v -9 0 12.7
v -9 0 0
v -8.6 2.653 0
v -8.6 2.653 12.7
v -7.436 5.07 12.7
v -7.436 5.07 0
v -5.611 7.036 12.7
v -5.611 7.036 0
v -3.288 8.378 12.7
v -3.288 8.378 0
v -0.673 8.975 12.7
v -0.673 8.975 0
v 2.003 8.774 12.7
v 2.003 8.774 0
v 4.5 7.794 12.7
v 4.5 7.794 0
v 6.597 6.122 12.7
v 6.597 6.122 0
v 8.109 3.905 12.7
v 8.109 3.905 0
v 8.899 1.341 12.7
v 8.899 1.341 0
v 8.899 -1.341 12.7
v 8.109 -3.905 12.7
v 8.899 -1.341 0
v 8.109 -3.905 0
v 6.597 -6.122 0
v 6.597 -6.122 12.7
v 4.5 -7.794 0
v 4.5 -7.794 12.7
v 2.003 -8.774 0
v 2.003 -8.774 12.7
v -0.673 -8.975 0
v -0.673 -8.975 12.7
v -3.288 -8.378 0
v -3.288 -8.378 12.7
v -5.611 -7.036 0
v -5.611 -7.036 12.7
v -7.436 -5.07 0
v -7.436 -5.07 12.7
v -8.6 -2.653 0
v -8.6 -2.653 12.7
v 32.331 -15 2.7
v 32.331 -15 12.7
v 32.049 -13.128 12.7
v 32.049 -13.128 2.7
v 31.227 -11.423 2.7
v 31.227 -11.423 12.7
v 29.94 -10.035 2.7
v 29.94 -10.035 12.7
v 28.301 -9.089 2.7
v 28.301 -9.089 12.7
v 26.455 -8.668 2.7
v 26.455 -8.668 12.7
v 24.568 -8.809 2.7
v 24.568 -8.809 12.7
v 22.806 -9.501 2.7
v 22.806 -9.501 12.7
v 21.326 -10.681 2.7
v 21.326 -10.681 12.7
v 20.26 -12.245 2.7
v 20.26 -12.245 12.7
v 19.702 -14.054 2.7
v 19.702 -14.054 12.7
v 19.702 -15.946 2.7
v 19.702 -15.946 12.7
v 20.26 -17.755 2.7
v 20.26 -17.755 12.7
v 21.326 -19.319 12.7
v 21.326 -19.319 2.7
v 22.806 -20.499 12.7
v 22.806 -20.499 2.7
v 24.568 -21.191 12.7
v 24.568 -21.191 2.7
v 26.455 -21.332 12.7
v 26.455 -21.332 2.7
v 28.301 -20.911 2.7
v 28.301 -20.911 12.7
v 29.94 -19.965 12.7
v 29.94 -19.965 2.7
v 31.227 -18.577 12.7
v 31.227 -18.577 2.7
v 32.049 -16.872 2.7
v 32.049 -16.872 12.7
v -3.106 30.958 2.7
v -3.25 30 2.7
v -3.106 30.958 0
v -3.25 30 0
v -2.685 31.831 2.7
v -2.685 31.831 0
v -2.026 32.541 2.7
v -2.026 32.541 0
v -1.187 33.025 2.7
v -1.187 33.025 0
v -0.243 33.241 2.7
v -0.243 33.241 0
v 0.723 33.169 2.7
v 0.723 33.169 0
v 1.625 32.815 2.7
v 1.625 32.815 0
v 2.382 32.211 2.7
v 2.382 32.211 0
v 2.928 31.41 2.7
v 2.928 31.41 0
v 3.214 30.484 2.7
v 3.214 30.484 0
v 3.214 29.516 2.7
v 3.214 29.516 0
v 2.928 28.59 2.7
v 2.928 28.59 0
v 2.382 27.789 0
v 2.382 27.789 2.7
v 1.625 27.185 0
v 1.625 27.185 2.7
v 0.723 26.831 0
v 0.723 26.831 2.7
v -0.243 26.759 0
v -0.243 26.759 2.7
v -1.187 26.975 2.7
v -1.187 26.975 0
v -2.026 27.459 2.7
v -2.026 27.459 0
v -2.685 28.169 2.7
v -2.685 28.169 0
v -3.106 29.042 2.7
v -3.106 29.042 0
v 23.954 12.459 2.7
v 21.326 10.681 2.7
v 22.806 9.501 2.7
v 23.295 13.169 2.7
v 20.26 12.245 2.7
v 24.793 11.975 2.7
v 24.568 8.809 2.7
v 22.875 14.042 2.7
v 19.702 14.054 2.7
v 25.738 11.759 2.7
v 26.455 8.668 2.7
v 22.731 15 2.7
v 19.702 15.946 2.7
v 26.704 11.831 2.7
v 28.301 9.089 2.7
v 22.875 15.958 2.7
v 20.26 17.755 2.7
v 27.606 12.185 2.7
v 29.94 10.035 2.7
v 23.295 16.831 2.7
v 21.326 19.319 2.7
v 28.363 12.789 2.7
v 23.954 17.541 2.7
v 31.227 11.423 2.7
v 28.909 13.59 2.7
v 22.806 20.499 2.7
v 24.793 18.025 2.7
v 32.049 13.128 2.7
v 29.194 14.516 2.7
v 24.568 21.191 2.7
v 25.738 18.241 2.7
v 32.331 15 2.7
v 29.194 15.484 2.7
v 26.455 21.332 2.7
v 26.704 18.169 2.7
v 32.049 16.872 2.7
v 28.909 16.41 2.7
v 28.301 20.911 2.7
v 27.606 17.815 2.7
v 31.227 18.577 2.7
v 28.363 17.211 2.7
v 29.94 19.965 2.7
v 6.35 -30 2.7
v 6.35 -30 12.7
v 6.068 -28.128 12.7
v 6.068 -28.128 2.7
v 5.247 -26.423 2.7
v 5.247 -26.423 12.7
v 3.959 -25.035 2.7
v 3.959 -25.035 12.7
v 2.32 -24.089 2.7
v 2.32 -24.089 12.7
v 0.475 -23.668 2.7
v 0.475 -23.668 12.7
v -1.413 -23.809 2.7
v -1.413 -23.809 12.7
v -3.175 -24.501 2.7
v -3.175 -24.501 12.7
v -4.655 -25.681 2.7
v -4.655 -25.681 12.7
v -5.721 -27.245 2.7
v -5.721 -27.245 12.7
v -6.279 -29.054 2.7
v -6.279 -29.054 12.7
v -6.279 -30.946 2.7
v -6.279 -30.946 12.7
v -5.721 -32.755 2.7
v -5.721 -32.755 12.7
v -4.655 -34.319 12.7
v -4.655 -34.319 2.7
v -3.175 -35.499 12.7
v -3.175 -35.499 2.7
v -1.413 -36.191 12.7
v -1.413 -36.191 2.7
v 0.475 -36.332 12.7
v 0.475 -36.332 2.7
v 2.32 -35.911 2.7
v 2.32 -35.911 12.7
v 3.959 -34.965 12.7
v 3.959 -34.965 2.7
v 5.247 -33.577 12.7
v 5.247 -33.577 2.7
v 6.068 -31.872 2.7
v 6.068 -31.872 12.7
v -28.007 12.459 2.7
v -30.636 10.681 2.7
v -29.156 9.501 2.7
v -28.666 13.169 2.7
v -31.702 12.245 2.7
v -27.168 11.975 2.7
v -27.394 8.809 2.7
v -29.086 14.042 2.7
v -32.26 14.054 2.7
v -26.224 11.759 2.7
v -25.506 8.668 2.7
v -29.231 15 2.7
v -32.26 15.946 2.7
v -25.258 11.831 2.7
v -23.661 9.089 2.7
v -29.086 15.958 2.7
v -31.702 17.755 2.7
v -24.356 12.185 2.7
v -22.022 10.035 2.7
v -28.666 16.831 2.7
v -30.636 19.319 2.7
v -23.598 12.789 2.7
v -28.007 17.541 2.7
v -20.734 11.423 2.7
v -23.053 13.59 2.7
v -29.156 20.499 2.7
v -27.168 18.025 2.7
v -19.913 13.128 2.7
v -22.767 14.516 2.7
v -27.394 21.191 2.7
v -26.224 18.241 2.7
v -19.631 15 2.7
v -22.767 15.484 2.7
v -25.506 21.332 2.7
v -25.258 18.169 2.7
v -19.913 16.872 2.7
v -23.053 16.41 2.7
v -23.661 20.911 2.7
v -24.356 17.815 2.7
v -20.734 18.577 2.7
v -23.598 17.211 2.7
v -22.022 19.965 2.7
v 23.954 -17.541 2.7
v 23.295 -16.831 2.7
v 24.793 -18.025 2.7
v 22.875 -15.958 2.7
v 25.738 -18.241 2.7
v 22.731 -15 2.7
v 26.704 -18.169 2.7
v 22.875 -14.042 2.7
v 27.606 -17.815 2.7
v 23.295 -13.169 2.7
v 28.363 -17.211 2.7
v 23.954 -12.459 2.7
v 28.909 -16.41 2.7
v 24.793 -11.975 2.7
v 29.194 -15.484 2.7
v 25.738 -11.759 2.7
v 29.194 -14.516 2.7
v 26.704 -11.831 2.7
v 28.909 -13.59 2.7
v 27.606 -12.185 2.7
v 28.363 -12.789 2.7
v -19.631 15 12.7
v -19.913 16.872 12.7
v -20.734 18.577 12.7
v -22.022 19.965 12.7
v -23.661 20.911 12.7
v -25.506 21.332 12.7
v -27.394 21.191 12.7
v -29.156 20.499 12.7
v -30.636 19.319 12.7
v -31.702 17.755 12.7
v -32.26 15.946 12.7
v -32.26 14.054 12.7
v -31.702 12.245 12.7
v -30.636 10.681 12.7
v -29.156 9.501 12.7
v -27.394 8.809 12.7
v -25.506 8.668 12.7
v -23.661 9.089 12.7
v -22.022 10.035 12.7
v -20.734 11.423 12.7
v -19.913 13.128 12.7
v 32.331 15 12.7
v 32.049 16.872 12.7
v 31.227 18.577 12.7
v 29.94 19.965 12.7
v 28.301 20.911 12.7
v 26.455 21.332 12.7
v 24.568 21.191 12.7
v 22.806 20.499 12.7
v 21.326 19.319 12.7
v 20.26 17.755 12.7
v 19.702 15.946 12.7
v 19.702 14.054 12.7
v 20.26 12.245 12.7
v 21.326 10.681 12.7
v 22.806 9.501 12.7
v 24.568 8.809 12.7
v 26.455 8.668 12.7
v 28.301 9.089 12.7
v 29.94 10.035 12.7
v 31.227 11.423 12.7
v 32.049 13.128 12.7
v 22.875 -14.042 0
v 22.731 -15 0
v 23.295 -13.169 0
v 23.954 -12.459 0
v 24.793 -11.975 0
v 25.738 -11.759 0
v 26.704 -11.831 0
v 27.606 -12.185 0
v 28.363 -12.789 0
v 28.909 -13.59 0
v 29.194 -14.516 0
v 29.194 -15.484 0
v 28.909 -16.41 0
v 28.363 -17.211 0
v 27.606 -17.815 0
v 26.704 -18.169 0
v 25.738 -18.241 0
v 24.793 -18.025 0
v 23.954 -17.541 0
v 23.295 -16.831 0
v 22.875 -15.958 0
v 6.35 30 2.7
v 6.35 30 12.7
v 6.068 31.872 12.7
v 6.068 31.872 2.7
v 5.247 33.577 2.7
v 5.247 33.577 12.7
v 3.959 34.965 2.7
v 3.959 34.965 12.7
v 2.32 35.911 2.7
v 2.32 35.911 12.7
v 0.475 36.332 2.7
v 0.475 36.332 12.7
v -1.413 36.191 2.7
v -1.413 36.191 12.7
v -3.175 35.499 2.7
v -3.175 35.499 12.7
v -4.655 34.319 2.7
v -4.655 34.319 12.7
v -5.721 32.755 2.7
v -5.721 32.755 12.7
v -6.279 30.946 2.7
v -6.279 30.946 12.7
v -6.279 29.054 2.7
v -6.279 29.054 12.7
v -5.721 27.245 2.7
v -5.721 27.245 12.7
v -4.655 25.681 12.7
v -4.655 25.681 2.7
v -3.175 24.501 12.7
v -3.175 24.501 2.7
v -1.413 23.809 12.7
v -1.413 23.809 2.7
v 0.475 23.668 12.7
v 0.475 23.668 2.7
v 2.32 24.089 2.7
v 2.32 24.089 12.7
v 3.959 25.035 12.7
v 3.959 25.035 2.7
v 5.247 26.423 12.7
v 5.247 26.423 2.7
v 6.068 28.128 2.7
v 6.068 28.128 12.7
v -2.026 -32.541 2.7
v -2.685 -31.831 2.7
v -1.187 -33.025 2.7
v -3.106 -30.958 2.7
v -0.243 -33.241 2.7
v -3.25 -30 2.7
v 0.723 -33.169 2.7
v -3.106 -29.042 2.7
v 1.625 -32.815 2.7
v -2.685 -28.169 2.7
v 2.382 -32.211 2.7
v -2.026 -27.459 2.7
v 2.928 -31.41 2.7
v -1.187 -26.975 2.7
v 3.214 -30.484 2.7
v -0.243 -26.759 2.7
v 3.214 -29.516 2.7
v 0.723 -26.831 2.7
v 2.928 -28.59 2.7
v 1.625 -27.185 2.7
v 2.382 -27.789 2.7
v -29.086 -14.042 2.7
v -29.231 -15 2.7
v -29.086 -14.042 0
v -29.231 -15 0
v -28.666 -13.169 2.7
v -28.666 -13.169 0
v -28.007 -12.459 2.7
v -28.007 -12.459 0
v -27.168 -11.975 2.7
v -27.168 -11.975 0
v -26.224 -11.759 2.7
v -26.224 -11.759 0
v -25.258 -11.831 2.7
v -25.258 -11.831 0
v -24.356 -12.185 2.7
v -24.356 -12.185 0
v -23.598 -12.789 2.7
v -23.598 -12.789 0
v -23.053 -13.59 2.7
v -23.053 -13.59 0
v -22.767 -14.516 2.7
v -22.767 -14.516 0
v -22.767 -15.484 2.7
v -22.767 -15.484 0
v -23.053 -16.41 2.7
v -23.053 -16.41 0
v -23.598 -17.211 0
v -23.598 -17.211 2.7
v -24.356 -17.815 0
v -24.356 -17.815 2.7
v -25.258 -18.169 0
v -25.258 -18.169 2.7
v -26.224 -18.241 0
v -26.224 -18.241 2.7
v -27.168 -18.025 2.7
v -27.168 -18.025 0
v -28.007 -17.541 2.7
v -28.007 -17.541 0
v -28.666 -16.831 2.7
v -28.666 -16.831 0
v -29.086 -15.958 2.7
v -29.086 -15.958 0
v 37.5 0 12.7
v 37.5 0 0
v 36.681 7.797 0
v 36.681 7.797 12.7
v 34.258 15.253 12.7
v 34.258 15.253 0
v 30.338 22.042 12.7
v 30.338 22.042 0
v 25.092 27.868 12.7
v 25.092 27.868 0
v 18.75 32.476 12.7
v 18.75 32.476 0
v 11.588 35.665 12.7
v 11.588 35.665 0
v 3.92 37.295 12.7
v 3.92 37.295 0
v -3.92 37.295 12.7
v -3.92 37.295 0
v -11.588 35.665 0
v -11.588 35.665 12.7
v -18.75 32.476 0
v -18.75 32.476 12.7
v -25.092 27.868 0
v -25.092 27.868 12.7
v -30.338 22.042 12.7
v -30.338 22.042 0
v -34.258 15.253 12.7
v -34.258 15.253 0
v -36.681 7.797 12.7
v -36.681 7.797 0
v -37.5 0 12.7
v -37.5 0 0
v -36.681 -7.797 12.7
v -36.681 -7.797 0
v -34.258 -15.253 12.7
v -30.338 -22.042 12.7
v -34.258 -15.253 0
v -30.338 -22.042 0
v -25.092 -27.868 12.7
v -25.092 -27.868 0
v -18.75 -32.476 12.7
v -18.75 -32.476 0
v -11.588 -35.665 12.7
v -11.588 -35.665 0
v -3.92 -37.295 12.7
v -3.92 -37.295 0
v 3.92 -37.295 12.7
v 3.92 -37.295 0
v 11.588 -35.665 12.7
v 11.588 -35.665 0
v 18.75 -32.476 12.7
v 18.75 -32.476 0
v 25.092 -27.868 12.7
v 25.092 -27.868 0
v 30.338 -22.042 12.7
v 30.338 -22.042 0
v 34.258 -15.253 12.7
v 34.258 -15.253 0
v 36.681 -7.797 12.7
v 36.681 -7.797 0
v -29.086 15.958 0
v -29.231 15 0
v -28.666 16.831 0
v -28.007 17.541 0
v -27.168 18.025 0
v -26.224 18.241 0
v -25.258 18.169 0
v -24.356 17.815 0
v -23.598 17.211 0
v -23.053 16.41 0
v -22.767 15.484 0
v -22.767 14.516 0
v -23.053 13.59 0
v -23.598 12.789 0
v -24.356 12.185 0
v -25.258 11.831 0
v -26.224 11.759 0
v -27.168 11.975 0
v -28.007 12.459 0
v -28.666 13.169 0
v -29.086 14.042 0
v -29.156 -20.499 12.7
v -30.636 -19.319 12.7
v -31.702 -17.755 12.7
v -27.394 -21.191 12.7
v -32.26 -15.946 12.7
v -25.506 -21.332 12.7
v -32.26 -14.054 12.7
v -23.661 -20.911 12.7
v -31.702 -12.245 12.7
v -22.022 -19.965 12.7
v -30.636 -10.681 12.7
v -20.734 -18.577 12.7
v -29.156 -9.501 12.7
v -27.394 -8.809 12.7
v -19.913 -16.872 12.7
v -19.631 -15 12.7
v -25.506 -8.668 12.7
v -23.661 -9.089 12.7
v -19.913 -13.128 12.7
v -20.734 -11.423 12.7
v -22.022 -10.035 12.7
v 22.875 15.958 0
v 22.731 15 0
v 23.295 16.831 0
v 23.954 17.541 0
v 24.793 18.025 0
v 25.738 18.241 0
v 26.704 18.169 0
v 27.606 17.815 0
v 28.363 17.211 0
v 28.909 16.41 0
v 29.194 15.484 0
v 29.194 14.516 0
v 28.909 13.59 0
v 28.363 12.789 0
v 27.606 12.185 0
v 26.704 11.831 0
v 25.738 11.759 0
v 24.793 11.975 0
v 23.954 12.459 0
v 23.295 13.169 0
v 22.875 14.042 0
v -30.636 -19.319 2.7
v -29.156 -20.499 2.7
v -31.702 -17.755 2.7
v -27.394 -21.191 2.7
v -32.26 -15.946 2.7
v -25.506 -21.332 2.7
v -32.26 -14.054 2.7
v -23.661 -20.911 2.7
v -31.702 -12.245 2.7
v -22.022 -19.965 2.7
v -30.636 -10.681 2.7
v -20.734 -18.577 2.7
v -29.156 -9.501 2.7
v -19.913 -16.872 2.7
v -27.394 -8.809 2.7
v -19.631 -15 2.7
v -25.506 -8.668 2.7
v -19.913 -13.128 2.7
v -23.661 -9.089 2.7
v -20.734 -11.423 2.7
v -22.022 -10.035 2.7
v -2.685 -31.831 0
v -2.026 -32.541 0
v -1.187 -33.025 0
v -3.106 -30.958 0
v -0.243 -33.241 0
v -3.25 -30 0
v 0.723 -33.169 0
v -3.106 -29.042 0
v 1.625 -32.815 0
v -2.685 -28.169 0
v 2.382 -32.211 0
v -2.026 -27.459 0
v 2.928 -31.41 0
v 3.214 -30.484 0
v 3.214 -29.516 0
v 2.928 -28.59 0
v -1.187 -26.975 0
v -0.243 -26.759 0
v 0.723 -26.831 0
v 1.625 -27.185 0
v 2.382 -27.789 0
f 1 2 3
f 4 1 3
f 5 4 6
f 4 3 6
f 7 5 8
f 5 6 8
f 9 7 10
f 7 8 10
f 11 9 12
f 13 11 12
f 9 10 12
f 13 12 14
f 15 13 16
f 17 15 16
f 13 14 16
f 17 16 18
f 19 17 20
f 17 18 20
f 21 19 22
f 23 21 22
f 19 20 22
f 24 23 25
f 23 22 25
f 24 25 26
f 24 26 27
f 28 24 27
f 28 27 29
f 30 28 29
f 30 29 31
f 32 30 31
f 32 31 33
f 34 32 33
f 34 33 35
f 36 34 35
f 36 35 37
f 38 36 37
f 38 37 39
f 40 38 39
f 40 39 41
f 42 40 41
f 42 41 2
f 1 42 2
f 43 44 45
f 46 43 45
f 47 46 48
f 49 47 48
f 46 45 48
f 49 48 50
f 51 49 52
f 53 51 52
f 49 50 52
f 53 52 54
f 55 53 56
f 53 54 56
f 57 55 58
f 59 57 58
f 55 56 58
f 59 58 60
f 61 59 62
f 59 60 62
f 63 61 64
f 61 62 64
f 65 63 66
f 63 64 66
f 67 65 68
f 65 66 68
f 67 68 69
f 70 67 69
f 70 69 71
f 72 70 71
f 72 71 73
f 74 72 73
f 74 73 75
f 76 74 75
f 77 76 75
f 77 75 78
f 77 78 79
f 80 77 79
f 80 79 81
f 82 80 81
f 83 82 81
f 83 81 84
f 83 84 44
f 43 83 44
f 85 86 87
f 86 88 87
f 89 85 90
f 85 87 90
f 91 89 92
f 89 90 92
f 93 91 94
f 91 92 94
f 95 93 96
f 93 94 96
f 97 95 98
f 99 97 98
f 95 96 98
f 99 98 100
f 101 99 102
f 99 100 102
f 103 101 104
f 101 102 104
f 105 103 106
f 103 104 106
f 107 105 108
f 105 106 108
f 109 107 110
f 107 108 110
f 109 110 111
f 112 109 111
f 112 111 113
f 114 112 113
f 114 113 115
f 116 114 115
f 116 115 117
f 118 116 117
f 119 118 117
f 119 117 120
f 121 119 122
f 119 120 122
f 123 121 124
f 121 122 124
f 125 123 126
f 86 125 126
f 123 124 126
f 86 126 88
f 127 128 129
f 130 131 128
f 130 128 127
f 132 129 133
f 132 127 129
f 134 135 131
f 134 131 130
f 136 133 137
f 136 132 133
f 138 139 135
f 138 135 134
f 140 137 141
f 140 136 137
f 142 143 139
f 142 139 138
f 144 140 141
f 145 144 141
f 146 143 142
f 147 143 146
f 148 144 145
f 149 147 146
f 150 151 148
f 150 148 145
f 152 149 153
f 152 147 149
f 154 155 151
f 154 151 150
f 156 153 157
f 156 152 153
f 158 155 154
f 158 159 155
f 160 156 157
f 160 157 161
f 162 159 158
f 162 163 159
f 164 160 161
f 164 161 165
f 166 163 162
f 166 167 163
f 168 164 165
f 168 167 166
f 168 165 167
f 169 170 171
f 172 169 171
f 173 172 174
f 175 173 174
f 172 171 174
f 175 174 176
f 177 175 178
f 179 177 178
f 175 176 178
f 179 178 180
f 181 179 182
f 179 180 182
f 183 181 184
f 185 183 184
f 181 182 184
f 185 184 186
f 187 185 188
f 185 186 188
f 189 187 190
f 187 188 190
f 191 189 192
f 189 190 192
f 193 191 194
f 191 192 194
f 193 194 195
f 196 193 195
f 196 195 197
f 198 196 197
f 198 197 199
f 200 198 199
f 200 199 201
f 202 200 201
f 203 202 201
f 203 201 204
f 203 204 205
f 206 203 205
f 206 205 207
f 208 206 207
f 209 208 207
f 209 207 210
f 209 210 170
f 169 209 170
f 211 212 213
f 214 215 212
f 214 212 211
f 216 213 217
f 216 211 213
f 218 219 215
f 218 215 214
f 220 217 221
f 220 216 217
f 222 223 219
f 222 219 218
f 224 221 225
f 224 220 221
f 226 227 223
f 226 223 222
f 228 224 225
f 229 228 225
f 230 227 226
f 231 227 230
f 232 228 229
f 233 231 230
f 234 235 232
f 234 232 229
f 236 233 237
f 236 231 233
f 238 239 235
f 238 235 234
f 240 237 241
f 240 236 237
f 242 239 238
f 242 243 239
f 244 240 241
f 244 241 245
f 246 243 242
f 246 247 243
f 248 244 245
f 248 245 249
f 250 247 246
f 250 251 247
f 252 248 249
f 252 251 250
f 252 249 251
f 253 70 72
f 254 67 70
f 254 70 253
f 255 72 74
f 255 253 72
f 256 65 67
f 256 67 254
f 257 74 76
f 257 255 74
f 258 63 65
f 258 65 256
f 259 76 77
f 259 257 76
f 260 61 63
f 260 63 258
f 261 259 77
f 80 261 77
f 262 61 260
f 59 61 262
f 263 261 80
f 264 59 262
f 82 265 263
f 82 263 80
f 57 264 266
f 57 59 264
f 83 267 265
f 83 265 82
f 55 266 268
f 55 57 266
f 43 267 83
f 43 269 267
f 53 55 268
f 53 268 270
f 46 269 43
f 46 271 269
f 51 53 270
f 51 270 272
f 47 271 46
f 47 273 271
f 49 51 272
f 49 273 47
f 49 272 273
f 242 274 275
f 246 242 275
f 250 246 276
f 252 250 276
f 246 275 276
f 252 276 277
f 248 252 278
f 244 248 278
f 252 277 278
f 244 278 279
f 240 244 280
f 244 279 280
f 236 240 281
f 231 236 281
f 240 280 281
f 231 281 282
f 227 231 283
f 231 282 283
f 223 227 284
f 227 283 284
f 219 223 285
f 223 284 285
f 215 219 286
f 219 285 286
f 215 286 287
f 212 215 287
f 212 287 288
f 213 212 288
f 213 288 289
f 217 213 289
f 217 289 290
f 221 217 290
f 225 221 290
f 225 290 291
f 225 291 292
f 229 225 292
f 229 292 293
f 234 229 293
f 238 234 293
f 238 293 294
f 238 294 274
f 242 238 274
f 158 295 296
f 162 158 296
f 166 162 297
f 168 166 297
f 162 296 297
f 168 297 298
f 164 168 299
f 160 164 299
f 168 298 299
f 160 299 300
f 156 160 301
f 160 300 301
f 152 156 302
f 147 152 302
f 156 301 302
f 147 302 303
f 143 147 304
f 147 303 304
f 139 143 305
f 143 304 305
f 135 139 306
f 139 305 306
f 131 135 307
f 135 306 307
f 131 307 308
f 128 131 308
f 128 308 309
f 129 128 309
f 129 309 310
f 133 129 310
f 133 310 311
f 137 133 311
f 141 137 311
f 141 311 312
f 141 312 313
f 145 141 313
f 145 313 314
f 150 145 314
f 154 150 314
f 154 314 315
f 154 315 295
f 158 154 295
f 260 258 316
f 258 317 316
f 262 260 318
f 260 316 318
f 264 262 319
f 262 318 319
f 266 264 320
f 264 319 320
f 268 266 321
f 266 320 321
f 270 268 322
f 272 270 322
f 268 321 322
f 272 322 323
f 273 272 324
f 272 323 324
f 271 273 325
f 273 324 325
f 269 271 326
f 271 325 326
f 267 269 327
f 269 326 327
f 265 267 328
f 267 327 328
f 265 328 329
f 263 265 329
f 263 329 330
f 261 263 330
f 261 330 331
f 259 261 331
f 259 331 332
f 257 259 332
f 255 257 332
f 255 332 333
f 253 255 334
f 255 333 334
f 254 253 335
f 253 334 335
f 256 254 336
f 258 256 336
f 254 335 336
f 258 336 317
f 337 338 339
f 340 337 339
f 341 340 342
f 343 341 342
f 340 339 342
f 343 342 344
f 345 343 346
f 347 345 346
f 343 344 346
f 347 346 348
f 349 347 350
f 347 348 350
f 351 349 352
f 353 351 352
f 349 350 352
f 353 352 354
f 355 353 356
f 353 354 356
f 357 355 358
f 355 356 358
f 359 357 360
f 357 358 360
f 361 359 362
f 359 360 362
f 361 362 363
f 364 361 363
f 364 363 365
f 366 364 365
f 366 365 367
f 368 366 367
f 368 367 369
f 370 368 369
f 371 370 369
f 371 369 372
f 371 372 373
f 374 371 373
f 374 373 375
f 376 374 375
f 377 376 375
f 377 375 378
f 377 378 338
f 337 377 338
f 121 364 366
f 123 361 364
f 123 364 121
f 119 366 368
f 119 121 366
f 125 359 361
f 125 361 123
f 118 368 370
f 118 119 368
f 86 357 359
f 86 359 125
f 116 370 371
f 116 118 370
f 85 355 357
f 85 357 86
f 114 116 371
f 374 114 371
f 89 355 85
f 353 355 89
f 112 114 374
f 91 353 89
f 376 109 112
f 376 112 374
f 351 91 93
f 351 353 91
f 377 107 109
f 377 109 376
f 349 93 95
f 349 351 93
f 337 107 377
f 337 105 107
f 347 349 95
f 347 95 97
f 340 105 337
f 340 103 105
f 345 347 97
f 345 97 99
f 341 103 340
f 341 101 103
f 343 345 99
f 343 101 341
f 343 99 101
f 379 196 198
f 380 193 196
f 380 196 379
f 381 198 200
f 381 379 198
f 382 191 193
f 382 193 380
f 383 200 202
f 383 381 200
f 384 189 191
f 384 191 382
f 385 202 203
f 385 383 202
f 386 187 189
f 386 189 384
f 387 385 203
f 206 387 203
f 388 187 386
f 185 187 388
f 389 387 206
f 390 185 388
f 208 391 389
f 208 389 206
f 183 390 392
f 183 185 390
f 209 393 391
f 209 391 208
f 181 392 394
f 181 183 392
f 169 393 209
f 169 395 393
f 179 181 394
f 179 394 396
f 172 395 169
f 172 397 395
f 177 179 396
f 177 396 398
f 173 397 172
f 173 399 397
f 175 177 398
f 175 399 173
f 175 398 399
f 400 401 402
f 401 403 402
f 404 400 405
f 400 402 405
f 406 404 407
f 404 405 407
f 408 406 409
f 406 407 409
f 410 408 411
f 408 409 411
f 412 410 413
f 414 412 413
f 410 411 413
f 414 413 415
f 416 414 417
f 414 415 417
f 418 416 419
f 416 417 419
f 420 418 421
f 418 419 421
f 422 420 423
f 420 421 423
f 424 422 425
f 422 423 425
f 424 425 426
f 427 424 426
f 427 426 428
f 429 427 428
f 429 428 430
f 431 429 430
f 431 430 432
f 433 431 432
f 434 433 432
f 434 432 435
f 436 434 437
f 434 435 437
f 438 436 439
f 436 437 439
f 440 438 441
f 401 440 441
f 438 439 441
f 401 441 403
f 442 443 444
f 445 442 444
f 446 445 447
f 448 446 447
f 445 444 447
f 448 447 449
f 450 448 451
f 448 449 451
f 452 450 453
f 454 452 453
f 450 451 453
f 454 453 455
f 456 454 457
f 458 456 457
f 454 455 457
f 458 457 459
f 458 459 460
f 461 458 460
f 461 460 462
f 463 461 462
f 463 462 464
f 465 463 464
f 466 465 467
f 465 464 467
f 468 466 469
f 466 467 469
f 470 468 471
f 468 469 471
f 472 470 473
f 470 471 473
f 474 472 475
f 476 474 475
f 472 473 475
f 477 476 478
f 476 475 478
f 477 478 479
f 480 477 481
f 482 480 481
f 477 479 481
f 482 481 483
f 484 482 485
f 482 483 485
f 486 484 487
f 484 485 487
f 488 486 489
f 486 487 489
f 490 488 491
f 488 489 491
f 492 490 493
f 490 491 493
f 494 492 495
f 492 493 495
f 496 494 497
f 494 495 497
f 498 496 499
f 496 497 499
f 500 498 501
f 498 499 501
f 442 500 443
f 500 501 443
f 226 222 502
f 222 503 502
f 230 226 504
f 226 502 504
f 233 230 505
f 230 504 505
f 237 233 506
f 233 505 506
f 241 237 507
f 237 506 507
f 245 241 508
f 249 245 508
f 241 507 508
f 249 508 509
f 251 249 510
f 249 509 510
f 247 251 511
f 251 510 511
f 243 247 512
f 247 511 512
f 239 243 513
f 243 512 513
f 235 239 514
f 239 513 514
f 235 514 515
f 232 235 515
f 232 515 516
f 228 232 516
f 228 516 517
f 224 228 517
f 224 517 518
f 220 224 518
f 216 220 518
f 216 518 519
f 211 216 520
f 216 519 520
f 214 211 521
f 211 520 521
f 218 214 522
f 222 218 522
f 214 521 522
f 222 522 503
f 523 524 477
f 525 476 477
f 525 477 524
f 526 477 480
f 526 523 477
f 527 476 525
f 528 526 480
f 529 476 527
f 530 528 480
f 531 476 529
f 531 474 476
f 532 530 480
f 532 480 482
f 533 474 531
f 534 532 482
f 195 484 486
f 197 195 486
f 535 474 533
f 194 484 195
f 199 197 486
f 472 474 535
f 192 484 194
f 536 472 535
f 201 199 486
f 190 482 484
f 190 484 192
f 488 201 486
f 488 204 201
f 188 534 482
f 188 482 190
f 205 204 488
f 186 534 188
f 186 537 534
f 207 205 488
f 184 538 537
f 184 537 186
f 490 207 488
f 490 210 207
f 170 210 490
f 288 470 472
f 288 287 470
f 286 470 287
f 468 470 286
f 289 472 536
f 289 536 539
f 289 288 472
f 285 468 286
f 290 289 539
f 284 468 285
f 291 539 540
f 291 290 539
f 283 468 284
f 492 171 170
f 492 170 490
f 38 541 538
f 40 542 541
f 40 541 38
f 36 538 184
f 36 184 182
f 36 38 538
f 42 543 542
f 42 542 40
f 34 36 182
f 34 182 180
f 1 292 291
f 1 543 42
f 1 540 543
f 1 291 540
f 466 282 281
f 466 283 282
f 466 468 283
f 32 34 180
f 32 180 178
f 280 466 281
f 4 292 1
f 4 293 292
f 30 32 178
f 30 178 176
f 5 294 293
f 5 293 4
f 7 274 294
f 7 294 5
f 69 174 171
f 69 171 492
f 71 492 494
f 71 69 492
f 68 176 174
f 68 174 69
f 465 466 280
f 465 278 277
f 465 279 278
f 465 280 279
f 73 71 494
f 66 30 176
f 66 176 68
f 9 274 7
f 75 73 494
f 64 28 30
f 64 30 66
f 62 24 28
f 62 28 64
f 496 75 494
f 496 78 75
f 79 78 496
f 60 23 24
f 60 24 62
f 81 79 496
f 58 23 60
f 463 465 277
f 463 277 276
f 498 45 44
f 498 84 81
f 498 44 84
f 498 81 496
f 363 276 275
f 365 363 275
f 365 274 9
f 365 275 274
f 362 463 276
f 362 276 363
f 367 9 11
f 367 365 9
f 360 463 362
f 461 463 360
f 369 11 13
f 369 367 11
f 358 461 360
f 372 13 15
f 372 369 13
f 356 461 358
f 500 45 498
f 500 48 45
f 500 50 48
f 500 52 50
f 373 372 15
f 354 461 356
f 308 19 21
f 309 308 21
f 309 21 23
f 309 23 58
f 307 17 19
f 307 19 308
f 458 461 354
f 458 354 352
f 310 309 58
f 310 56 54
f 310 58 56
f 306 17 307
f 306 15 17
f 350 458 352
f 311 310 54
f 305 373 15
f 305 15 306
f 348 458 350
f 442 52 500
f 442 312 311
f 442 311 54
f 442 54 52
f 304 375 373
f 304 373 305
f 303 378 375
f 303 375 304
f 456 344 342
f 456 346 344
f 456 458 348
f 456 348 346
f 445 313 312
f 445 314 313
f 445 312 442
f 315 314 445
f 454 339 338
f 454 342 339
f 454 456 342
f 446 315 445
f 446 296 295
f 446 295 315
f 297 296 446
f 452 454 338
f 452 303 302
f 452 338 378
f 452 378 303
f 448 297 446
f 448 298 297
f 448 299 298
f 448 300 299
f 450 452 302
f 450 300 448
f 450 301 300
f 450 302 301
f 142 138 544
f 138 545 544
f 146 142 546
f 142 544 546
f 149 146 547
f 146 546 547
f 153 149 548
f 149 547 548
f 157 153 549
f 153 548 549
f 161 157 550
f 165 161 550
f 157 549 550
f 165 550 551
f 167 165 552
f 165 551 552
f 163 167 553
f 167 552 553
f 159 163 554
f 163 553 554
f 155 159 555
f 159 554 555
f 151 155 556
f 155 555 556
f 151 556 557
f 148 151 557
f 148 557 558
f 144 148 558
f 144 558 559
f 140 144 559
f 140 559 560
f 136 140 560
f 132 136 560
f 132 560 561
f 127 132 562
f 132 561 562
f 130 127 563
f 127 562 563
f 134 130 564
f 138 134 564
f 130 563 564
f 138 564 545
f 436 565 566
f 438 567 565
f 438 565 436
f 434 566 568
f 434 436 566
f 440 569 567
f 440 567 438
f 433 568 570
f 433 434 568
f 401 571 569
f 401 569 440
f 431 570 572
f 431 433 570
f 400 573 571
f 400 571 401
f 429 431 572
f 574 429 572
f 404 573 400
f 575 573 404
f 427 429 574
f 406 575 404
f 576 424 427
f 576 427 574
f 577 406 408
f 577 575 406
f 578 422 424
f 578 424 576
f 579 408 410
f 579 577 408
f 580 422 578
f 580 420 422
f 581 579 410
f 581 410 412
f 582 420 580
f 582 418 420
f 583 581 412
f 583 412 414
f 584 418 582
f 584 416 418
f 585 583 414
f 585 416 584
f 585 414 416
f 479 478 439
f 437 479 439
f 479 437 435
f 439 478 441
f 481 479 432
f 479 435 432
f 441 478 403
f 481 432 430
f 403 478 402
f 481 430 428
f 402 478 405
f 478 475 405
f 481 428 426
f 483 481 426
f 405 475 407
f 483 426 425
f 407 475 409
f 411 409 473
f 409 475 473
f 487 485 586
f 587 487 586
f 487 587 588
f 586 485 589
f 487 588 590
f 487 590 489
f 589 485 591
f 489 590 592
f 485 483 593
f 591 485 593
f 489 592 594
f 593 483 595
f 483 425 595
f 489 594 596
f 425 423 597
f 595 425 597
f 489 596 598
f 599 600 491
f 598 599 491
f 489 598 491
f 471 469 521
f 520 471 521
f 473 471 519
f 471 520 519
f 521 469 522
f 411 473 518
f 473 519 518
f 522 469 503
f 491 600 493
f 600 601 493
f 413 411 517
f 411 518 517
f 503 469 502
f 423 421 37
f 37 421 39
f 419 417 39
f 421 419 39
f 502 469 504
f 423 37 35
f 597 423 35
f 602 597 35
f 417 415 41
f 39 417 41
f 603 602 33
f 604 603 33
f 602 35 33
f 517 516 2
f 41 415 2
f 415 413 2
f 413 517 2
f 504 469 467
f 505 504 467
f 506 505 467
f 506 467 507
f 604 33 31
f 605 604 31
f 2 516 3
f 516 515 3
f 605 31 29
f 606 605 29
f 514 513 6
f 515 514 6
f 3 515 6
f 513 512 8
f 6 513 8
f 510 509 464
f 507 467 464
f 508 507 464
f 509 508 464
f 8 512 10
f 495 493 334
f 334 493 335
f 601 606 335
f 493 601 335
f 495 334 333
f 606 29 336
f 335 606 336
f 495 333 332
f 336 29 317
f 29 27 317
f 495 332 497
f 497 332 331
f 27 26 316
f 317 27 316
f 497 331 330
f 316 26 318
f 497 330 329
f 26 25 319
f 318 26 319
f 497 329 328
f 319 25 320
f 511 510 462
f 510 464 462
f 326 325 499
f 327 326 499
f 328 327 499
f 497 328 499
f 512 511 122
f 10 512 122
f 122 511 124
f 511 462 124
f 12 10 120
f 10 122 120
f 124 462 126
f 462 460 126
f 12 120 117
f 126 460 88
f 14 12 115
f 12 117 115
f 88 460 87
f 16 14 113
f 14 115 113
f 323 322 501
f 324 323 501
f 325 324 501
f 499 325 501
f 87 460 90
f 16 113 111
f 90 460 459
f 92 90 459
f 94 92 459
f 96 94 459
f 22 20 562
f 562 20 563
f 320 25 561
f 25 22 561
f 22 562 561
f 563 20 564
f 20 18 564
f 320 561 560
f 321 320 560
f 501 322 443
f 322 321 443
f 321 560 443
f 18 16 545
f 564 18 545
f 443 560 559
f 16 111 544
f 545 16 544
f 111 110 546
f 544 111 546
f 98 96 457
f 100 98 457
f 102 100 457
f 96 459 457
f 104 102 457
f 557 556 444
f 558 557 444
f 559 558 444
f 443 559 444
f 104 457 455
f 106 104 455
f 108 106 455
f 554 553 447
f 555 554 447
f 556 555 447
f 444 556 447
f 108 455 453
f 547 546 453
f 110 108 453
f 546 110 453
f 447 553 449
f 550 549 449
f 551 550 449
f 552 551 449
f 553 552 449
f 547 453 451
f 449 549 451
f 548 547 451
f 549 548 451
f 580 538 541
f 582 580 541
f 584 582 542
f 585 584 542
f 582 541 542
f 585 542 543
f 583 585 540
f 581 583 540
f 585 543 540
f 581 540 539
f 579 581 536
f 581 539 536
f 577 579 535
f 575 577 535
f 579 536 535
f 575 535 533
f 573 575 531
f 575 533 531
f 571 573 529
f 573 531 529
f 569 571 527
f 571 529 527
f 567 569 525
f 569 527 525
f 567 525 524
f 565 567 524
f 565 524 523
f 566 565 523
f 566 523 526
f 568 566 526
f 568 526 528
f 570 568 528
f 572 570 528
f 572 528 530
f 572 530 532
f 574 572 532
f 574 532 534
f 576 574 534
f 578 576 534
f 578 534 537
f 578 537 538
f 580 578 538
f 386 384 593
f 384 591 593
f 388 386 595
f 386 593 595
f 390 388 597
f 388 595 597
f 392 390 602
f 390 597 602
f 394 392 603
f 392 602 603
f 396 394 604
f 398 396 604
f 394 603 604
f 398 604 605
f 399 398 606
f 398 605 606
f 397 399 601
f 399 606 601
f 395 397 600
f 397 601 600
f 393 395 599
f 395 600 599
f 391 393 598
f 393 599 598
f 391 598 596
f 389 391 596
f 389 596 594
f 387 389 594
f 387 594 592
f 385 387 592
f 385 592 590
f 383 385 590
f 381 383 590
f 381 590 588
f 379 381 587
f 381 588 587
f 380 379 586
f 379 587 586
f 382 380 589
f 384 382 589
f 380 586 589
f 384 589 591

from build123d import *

# Parameters (mm, degrees)
F0_R           = 37.5
F1_DEPTH       = 12.7
F3_D           = 18
F5_D           = 6.5
F5_CBORE_D     = 12.7
F5_CBORE_DEPTH = 10


# Not quite as in the source:
# - a length typed as a fraction of an inch, garbled in the dataset ("3 / 203.2 mm" for 3/8 in), is restored


with BuildPart() as f1:
    # F0 (on Top) → F1 (new body)
    with BuildSketch(Plane.XY):
        Circle(F0_R)
    extrude(amount=F1_DEPTH)

    # F3 (through all)
    with Locations(Plane.XY.offset(12.7)):
        with Locations((0, 0)):
            Hole(F3_D / 2)

    # F5 (through all)
    with Locations(Plane.XY.offset(12.7)):
        with Locations((0, 30), (25.9807621135, 15), (25.9807621135, -15), (0, -30), (-25.9807621135, -15), (-25.9807621135, 15)):
            CounterBoreHole(F5_D / 2, F5_CBORE_D / 2, F5_CBORE_DEPTH)


solid = f1.part
